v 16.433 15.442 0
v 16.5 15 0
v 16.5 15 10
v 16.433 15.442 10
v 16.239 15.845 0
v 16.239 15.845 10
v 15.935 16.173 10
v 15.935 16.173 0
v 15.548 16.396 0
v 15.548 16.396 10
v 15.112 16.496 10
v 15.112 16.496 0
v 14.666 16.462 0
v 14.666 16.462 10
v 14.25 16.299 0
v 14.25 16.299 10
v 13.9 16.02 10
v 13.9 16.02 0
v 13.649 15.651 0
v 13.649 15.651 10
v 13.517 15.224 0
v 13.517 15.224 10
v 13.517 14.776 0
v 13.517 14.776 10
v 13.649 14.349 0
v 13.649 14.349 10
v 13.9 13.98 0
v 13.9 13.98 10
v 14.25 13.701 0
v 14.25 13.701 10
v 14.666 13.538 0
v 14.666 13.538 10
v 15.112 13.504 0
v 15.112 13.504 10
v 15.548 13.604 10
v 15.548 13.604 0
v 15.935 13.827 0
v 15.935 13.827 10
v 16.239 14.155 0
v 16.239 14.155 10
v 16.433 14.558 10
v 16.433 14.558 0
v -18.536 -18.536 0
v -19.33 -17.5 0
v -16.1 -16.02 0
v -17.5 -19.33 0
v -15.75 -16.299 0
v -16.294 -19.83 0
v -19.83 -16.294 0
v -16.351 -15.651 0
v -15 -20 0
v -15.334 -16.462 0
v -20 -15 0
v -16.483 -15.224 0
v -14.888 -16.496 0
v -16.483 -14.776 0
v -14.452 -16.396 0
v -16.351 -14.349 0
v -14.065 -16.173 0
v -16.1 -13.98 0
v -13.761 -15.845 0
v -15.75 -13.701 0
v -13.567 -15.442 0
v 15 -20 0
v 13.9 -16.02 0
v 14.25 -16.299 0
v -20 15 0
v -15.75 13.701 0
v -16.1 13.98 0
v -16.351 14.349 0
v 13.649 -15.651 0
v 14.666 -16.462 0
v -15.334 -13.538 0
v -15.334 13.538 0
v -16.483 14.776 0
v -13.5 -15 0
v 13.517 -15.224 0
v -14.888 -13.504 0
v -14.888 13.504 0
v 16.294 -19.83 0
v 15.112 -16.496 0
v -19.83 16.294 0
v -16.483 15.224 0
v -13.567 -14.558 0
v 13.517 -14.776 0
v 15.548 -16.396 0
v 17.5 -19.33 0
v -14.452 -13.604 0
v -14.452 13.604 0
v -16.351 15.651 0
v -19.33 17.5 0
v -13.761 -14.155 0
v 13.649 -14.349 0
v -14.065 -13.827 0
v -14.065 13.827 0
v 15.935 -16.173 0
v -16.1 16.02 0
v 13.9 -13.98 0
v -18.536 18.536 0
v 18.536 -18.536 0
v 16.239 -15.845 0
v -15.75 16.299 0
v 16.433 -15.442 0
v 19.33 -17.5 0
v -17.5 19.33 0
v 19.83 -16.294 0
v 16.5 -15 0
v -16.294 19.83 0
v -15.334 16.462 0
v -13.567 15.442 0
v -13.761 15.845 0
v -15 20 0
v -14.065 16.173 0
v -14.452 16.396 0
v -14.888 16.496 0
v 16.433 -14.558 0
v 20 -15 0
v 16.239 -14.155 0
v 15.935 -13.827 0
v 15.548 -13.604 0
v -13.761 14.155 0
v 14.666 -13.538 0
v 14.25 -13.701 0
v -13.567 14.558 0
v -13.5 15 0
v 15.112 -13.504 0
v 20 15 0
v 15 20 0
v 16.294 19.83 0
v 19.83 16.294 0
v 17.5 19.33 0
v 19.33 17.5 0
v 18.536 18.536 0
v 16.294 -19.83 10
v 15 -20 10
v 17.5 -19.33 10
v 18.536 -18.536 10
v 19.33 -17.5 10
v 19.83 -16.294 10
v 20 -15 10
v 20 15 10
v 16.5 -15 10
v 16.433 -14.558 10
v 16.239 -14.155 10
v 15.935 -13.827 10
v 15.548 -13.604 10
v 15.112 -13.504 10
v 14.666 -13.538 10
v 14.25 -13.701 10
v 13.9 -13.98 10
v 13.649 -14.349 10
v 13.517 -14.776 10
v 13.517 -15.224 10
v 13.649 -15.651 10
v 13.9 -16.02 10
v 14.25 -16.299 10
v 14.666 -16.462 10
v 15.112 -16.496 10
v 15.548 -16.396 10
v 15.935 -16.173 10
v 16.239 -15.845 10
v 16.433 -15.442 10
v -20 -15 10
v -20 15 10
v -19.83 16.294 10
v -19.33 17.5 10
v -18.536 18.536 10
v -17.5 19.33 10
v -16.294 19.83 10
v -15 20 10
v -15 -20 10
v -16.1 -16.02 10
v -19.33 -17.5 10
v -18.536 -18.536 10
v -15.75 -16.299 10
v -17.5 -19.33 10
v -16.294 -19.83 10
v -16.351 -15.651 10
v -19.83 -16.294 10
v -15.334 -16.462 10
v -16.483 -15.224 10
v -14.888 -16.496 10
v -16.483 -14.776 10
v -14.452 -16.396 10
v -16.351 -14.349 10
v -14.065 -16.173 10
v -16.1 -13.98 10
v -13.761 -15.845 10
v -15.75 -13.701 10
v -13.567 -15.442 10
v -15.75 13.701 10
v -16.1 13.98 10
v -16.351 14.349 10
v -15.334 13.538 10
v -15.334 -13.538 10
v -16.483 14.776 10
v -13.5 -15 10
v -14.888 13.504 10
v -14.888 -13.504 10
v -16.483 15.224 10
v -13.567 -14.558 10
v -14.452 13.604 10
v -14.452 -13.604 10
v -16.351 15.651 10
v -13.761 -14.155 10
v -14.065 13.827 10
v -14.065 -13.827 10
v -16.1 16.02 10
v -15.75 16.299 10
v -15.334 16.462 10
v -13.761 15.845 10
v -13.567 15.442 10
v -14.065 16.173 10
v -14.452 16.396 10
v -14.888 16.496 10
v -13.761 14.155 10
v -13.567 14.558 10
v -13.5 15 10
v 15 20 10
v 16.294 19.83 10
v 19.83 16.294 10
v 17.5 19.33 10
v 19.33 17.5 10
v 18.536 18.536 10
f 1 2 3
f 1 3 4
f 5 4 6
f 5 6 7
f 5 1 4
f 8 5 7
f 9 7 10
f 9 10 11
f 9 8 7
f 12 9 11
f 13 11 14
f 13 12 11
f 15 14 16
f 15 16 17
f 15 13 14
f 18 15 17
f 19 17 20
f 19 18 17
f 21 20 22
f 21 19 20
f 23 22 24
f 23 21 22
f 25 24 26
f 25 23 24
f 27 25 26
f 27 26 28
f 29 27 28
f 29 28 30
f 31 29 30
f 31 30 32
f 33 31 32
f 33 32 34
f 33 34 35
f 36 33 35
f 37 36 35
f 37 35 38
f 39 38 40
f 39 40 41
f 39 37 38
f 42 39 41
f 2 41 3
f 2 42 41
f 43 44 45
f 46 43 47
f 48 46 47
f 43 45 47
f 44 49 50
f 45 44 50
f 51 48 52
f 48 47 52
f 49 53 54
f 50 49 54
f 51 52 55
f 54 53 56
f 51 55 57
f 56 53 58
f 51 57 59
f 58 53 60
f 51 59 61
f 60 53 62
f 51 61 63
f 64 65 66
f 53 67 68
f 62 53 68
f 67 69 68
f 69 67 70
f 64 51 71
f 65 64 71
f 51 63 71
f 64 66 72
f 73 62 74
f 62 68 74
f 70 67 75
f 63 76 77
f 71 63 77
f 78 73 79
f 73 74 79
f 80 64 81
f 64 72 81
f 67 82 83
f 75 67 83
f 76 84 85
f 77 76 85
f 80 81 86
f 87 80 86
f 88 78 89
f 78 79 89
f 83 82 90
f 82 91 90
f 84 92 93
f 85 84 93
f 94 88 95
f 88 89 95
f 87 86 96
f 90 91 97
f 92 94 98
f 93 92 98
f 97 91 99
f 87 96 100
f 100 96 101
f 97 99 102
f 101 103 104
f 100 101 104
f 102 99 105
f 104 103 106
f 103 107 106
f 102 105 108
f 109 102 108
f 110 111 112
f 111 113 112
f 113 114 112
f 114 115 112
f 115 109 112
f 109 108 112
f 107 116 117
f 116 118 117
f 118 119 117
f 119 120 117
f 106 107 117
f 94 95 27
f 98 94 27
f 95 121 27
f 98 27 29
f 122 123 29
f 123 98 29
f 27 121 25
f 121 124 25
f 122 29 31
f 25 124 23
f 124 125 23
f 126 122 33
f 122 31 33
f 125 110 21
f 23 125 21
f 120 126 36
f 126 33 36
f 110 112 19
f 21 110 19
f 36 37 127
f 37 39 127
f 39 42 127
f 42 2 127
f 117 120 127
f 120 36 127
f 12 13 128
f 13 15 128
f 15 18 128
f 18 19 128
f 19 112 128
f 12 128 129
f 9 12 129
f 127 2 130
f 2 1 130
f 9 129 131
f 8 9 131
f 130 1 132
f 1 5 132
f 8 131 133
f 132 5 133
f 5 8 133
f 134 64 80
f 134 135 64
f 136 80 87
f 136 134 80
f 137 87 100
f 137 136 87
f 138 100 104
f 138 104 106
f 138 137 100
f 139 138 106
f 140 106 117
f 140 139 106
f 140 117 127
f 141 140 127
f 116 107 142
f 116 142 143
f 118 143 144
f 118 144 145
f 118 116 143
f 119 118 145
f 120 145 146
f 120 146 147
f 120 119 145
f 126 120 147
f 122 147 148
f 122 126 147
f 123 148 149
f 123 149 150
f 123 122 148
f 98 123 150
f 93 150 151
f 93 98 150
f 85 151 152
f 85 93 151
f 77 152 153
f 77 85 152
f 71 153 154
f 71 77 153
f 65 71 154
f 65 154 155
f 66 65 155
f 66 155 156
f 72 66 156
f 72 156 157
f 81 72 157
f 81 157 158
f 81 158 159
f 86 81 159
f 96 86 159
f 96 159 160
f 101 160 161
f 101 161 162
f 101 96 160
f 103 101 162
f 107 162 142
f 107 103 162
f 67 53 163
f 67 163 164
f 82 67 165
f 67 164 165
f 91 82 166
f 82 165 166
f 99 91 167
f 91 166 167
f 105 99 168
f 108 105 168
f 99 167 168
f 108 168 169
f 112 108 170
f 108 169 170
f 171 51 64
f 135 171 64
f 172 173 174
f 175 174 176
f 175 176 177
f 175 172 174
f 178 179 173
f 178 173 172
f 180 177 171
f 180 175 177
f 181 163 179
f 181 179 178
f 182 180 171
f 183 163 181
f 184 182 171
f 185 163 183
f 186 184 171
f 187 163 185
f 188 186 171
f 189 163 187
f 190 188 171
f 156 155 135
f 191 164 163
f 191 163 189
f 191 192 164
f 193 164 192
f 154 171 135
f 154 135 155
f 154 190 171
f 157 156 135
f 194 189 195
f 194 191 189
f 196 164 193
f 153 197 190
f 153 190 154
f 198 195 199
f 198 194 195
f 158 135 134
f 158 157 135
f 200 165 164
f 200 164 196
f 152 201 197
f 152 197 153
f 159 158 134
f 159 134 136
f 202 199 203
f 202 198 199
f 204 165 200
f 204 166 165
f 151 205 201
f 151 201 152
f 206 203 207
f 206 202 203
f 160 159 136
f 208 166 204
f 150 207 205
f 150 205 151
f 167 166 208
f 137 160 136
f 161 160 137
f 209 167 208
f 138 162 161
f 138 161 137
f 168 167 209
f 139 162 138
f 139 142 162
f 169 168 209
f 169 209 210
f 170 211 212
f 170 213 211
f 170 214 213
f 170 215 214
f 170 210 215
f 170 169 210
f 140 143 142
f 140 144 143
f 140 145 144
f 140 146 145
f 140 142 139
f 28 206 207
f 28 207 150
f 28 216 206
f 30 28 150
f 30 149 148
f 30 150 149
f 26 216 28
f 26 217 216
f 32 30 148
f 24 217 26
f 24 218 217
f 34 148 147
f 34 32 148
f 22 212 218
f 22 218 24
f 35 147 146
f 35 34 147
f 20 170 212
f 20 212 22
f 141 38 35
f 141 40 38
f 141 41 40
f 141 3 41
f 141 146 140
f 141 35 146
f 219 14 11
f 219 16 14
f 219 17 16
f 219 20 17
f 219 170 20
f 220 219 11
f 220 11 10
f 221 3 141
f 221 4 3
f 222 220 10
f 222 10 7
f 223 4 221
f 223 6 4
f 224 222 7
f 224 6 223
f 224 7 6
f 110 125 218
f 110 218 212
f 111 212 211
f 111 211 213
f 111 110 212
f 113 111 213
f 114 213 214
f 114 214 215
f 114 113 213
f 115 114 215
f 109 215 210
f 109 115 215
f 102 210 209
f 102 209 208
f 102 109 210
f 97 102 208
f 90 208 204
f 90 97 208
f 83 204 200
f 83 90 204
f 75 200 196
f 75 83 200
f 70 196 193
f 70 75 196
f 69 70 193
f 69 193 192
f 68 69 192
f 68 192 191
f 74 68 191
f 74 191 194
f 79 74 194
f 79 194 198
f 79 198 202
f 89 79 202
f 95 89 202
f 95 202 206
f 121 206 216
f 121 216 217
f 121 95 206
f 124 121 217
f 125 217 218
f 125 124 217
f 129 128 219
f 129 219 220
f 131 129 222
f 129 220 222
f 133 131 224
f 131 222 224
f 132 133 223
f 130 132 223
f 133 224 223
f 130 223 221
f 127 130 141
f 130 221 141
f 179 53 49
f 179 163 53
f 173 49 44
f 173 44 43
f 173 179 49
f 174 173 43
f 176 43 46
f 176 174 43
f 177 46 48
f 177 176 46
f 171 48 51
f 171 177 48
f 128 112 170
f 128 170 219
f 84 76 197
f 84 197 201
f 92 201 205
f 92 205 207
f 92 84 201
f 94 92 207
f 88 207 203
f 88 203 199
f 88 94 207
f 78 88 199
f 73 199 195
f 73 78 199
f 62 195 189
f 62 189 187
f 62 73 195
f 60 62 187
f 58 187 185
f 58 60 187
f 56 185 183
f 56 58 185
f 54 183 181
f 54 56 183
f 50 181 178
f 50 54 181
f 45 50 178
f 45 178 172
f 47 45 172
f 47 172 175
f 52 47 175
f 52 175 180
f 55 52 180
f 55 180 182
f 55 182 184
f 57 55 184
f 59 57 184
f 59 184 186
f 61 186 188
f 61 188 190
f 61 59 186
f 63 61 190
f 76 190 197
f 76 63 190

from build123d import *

# Parameters (mm, degrees)
SKETCH_1_W      = 40
SKETCH_1_H      = 40
SKETCH_1_R      = 1.5
EXTRUDE_1_DEPTH = 10
FILLET_1_R      = 5


with BuildPart() as part:
    # 草图1 → 凸台-拉伸1 (new body)
    with BuildSketch(Plane.XY):
        Rectangle(SKETCH_1_W, SKETCH_1_H)
        with Locations((-15, 15)):
            Circle(SKETCH_1_R, mode=Mode.SUBTRACT)
        with Locations((15, 15)):
            Circle(SKETCH_1_R, mode=Mode.SUBTRACT)
        with Locations((-15, -15)):
            Circle(SKETCH_1_R, mode=Mode.SUBTRACT)
        with Locations((15, -15)):
            Circle(SKETCH_1_R, mode=Mode.SUBTRACT)
    extrude(amount=EXTRUDE_1_DEPTH)

    # 圆角1
    fillet_1_edges = [part.edges().sort_by_distance(p)[0] for p in [
        (20, -20, 5),
        (-20, -20, 5),
        (-20, 20, 5),
        (20, 20, 5),
    ]]
    fillet(fillet_1_edges, radius=FILLET_1_R)


solid = part.part
